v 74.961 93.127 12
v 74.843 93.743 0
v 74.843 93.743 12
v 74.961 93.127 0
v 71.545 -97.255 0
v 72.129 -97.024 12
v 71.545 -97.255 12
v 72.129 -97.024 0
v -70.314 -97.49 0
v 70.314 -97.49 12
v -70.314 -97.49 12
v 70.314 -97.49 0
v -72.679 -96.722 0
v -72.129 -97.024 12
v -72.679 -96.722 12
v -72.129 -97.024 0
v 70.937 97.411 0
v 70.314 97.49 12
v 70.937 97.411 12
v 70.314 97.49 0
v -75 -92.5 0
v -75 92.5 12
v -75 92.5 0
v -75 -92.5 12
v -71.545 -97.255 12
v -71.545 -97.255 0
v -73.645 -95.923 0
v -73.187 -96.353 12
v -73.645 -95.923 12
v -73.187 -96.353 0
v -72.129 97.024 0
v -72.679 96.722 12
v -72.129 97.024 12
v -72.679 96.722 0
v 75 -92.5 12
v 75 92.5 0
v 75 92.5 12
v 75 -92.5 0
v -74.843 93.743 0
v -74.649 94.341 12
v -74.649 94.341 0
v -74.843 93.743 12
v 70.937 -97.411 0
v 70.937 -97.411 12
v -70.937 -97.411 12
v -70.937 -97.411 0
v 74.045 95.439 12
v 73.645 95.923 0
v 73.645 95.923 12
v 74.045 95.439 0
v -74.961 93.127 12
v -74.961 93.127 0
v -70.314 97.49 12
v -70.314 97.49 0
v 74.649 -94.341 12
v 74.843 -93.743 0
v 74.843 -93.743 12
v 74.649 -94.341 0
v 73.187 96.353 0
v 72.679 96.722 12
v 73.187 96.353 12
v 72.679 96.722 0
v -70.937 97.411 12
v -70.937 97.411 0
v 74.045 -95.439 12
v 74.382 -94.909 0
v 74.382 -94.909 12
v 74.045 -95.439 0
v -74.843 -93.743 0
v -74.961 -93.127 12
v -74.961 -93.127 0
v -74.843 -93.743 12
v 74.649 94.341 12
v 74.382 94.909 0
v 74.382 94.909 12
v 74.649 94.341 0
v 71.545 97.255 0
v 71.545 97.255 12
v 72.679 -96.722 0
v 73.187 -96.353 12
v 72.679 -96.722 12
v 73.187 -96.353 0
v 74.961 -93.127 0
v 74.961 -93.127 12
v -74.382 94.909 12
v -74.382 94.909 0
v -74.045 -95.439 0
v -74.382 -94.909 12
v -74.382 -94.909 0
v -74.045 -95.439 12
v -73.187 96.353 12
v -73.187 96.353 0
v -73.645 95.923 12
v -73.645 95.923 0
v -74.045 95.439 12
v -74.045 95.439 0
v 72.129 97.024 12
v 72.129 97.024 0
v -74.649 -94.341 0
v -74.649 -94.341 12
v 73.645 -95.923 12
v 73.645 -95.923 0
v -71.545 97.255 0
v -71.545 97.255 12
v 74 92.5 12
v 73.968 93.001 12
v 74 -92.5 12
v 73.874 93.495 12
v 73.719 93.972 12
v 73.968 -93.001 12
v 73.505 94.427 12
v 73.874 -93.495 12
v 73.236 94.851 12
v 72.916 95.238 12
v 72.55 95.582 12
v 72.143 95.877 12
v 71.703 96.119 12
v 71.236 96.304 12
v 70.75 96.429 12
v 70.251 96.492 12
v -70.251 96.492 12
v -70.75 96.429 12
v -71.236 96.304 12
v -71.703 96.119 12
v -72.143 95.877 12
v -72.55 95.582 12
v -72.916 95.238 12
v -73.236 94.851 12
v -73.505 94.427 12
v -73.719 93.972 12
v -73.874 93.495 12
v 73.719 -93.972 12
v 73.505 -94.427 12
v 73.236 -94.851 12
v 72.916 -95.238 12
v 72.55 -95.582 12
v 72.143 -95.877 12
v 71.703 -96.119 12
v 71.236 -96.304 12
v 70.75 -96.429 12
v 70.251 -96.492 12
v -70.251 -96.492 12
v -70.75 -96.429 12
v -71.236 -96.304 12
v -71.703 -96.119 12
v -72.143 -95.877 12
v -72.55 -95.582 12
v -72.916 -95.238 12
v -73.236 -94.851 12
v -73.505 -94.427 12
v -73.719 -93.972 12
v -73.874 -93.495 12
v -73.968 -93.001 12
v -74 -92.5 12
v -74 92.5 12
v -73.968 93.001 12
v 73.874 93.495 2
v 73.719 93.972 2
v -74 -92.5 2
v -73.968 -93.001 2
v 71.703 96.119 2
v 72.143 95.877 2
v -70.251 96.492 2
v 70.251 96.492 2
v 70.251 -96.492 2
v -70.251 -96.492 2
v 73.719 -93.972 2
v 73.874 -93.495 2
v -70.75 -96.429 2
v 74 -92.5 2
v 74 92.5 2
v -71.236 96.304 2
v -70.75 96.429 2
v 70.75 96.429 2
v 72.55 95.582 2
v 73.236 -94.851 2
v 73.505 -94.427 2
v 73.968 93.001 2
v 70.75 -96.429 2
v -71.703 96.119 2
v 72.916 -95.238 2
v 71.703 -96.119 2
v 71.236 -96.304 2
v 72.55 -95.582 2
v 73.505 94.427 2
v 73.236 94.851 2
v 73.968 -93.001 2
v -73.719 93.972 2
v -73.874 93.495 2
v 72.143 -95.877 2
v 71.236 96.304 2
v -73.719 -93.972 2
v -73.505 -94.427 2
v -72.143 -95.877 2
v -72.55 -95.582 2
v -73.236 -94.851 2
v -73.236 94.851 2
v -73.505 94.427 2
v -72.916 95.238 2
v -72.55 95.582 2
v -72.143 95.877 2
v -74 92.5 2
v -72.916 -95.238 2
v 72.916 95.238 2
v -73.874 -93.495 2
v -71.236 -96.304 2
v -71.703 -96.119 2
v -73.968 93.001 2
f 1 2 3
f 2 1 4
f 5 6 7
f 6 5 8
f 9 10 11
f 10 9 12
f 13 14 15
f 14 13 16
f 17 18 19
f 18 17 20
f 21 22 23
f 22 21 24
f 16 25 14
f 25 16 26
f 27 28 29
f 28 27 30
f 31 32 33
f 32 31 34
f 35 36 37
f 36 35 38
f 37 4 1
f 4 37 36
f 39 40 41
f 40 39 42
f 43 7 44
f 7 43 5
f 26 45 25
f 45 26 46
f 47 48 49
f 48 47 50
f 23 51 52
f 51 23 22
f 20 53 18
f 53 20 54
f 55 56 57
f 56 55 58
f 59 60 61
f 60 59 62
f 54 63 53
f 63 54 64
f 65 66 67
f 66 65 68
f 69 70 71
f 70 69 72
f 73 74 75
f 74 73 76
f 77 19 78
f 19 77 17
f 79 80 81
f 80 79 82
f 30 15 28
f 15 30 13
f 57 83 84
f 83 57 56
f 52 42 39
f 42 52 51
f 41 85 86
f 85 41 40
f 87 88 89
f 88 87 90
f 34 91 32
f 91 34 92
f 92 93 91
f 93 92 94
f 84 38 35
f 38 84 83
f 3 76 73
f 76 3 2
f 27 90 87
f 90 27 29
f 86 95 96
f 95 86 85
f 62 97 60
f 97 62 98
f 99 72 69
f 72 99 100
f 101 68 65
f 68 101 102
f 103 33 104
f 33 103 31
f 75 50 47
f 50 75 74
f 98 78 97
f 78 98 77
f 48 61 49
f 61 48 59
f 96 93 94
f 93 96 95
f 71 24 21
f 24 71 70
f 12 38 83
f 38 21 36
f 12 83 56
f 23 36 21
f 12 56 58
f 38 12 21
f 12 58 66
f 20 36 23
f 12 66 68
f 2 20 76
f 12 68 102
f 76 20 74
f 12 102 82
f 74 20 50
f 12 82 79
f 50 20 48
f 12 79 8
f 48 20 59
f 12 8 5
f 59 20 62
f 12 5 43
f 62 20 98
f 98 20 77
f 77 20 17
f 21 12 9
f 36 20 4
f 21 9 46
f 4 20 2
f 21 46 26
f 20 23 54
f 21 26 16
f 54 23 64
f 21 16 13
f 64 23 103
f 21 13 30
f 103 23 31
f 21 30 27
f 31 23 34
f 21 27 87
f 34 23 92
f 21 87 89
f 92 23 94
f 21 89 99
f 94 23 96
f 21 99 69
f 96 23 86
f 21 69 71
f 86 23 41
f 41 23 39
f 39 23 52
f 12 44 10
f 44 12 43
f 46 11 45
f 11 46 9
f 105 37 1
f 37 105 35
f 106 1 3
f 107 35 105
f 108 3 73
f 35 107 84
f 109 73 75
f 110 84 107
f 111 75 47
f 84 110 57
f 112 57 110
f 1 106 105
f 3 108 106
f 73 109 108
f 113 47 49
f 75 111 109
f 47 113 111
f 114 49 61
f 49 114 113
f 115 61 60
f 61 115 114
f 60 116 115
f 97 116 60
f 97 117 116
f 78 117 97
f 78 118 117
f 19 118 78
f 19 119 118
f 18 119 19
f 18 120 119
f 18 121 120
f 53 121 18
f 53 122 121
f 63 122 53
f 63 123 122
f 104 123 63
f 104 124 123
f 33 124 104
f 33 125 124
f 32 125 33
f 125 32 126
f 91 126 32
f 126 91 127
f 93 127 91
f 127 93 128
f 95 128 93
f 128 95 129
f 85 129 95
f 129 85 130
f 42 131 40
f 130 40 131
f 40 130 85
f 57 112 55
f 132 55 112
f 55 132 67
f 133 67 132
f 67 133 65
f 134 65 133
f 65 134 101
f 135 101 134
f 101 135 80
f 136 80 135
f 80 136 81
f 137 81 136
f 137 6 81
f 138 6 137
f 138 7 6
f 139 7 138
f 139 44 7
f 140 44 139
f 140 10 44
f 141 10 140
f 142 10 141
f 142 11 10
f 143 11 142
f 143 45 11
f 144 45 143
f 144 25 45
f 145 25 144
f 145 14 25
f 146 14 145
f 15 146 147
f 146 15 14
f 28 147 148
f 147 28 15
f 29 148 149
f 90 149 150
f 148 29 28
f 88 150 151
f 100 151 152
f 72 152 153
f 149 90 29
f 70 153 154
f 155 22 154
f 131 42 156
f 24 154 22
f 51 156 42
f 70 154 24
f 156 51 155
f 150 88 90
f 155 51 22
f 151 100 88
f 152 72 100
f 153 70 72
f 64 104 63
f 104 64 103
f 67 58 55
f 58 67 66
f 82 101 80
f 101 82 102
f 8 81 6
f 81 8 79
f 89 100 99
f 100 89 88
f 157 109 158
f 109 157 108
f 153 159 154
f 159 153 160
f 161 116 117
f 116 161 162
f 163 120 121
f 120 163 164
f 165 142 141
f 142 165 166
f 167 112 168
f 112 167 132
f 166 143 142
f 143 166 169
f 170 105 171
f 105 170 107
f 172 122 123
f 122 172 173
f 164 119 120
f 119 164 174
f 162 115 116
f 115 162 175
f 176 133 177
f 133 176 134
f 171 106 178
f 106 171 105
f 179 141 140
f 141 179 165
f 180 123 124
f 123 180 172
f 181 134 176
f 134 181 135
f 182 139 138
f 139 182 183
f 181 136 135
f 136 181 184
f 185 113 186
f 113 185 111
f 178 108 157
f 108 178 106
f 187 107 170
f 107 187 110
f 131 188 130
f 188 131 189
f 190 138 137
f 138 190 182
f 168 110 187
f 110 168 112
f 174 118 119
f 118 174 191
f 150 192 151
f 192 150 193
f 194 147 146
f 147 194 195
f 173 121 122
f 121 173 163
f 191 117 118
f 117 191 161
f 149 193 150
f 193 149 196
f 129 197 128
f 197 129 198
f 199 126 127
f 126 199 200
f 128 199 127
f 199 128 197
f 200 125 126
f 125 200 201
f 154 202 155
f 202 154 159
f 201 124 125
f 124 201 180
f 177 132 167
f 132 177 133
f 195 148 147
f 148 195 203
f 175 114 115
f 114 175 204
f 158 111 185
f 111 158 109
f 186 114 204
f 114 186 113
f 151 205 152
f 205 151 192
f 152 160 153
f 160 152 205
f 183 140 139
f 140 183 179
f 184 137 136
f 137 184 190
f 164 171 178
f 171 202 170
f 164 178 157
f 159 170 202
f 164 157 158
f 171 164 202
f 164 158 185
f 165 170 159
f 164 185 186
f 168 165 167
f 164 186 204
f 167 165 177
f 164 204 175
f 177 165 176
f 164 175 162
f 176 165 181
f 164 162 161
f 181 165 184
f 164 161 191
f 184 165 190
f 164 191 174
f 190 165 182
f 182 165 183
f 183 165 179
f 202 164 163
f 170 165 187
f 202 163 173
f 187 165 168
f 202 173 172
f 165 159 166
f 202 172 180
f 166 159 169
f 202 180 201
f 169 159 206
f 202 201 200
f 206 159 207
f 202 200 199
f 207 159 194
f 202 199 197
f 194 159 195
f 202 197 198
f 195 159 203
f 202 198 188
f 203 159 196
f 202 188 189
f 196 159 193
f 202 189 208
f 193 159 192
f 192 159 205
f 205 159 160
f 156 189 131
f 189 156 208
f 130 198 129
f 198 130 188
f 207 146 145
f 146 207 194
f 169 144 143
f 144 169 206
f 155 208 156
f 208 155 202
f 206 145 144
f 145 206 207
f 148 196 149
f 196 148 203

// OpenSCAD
$fn = 50;


difference() {
	union() {
		hull() {
			translate(v = [-70.0000000000, 92.5000000000, 0]) {
				cylinder(h = 12, r = 5);
			}
			translate(v = [70.0000000000, 92.5000000000, 0]) {
				cylinder(h = 12, r = 5);
			}
			translate(v = [-70.0000000000, -92.5000000000, 0]) {
				cylinder(h = 12, r = 5);
			}
			translate(v = [70.0000000000, -92.5000000000, 0]) {
				cylinder(h = 12, r = 5);
			}
		}
	}
	union() {
		translate(v = [0, 0, 2]) {
			hull() {
				translate(v = [-70.0000000000, 92.5000000000, 0]) {
					cylinder(h = 10, r = 4);
				}
				translate(v = [70.0000000000, 92.5000000000, 0]) {
					cylinder(h = 10, r = 4);
				}
				translate(v = [-70.0000000000, -92.5000000000, 0]) {
					cylinder(h = 10, r = 4);
				}
				translate(v = [70.0000000000, -92.5000000000, 0]) {
					cylinder(h = 10, r = 4);
				}
			}
		}
	}
}
